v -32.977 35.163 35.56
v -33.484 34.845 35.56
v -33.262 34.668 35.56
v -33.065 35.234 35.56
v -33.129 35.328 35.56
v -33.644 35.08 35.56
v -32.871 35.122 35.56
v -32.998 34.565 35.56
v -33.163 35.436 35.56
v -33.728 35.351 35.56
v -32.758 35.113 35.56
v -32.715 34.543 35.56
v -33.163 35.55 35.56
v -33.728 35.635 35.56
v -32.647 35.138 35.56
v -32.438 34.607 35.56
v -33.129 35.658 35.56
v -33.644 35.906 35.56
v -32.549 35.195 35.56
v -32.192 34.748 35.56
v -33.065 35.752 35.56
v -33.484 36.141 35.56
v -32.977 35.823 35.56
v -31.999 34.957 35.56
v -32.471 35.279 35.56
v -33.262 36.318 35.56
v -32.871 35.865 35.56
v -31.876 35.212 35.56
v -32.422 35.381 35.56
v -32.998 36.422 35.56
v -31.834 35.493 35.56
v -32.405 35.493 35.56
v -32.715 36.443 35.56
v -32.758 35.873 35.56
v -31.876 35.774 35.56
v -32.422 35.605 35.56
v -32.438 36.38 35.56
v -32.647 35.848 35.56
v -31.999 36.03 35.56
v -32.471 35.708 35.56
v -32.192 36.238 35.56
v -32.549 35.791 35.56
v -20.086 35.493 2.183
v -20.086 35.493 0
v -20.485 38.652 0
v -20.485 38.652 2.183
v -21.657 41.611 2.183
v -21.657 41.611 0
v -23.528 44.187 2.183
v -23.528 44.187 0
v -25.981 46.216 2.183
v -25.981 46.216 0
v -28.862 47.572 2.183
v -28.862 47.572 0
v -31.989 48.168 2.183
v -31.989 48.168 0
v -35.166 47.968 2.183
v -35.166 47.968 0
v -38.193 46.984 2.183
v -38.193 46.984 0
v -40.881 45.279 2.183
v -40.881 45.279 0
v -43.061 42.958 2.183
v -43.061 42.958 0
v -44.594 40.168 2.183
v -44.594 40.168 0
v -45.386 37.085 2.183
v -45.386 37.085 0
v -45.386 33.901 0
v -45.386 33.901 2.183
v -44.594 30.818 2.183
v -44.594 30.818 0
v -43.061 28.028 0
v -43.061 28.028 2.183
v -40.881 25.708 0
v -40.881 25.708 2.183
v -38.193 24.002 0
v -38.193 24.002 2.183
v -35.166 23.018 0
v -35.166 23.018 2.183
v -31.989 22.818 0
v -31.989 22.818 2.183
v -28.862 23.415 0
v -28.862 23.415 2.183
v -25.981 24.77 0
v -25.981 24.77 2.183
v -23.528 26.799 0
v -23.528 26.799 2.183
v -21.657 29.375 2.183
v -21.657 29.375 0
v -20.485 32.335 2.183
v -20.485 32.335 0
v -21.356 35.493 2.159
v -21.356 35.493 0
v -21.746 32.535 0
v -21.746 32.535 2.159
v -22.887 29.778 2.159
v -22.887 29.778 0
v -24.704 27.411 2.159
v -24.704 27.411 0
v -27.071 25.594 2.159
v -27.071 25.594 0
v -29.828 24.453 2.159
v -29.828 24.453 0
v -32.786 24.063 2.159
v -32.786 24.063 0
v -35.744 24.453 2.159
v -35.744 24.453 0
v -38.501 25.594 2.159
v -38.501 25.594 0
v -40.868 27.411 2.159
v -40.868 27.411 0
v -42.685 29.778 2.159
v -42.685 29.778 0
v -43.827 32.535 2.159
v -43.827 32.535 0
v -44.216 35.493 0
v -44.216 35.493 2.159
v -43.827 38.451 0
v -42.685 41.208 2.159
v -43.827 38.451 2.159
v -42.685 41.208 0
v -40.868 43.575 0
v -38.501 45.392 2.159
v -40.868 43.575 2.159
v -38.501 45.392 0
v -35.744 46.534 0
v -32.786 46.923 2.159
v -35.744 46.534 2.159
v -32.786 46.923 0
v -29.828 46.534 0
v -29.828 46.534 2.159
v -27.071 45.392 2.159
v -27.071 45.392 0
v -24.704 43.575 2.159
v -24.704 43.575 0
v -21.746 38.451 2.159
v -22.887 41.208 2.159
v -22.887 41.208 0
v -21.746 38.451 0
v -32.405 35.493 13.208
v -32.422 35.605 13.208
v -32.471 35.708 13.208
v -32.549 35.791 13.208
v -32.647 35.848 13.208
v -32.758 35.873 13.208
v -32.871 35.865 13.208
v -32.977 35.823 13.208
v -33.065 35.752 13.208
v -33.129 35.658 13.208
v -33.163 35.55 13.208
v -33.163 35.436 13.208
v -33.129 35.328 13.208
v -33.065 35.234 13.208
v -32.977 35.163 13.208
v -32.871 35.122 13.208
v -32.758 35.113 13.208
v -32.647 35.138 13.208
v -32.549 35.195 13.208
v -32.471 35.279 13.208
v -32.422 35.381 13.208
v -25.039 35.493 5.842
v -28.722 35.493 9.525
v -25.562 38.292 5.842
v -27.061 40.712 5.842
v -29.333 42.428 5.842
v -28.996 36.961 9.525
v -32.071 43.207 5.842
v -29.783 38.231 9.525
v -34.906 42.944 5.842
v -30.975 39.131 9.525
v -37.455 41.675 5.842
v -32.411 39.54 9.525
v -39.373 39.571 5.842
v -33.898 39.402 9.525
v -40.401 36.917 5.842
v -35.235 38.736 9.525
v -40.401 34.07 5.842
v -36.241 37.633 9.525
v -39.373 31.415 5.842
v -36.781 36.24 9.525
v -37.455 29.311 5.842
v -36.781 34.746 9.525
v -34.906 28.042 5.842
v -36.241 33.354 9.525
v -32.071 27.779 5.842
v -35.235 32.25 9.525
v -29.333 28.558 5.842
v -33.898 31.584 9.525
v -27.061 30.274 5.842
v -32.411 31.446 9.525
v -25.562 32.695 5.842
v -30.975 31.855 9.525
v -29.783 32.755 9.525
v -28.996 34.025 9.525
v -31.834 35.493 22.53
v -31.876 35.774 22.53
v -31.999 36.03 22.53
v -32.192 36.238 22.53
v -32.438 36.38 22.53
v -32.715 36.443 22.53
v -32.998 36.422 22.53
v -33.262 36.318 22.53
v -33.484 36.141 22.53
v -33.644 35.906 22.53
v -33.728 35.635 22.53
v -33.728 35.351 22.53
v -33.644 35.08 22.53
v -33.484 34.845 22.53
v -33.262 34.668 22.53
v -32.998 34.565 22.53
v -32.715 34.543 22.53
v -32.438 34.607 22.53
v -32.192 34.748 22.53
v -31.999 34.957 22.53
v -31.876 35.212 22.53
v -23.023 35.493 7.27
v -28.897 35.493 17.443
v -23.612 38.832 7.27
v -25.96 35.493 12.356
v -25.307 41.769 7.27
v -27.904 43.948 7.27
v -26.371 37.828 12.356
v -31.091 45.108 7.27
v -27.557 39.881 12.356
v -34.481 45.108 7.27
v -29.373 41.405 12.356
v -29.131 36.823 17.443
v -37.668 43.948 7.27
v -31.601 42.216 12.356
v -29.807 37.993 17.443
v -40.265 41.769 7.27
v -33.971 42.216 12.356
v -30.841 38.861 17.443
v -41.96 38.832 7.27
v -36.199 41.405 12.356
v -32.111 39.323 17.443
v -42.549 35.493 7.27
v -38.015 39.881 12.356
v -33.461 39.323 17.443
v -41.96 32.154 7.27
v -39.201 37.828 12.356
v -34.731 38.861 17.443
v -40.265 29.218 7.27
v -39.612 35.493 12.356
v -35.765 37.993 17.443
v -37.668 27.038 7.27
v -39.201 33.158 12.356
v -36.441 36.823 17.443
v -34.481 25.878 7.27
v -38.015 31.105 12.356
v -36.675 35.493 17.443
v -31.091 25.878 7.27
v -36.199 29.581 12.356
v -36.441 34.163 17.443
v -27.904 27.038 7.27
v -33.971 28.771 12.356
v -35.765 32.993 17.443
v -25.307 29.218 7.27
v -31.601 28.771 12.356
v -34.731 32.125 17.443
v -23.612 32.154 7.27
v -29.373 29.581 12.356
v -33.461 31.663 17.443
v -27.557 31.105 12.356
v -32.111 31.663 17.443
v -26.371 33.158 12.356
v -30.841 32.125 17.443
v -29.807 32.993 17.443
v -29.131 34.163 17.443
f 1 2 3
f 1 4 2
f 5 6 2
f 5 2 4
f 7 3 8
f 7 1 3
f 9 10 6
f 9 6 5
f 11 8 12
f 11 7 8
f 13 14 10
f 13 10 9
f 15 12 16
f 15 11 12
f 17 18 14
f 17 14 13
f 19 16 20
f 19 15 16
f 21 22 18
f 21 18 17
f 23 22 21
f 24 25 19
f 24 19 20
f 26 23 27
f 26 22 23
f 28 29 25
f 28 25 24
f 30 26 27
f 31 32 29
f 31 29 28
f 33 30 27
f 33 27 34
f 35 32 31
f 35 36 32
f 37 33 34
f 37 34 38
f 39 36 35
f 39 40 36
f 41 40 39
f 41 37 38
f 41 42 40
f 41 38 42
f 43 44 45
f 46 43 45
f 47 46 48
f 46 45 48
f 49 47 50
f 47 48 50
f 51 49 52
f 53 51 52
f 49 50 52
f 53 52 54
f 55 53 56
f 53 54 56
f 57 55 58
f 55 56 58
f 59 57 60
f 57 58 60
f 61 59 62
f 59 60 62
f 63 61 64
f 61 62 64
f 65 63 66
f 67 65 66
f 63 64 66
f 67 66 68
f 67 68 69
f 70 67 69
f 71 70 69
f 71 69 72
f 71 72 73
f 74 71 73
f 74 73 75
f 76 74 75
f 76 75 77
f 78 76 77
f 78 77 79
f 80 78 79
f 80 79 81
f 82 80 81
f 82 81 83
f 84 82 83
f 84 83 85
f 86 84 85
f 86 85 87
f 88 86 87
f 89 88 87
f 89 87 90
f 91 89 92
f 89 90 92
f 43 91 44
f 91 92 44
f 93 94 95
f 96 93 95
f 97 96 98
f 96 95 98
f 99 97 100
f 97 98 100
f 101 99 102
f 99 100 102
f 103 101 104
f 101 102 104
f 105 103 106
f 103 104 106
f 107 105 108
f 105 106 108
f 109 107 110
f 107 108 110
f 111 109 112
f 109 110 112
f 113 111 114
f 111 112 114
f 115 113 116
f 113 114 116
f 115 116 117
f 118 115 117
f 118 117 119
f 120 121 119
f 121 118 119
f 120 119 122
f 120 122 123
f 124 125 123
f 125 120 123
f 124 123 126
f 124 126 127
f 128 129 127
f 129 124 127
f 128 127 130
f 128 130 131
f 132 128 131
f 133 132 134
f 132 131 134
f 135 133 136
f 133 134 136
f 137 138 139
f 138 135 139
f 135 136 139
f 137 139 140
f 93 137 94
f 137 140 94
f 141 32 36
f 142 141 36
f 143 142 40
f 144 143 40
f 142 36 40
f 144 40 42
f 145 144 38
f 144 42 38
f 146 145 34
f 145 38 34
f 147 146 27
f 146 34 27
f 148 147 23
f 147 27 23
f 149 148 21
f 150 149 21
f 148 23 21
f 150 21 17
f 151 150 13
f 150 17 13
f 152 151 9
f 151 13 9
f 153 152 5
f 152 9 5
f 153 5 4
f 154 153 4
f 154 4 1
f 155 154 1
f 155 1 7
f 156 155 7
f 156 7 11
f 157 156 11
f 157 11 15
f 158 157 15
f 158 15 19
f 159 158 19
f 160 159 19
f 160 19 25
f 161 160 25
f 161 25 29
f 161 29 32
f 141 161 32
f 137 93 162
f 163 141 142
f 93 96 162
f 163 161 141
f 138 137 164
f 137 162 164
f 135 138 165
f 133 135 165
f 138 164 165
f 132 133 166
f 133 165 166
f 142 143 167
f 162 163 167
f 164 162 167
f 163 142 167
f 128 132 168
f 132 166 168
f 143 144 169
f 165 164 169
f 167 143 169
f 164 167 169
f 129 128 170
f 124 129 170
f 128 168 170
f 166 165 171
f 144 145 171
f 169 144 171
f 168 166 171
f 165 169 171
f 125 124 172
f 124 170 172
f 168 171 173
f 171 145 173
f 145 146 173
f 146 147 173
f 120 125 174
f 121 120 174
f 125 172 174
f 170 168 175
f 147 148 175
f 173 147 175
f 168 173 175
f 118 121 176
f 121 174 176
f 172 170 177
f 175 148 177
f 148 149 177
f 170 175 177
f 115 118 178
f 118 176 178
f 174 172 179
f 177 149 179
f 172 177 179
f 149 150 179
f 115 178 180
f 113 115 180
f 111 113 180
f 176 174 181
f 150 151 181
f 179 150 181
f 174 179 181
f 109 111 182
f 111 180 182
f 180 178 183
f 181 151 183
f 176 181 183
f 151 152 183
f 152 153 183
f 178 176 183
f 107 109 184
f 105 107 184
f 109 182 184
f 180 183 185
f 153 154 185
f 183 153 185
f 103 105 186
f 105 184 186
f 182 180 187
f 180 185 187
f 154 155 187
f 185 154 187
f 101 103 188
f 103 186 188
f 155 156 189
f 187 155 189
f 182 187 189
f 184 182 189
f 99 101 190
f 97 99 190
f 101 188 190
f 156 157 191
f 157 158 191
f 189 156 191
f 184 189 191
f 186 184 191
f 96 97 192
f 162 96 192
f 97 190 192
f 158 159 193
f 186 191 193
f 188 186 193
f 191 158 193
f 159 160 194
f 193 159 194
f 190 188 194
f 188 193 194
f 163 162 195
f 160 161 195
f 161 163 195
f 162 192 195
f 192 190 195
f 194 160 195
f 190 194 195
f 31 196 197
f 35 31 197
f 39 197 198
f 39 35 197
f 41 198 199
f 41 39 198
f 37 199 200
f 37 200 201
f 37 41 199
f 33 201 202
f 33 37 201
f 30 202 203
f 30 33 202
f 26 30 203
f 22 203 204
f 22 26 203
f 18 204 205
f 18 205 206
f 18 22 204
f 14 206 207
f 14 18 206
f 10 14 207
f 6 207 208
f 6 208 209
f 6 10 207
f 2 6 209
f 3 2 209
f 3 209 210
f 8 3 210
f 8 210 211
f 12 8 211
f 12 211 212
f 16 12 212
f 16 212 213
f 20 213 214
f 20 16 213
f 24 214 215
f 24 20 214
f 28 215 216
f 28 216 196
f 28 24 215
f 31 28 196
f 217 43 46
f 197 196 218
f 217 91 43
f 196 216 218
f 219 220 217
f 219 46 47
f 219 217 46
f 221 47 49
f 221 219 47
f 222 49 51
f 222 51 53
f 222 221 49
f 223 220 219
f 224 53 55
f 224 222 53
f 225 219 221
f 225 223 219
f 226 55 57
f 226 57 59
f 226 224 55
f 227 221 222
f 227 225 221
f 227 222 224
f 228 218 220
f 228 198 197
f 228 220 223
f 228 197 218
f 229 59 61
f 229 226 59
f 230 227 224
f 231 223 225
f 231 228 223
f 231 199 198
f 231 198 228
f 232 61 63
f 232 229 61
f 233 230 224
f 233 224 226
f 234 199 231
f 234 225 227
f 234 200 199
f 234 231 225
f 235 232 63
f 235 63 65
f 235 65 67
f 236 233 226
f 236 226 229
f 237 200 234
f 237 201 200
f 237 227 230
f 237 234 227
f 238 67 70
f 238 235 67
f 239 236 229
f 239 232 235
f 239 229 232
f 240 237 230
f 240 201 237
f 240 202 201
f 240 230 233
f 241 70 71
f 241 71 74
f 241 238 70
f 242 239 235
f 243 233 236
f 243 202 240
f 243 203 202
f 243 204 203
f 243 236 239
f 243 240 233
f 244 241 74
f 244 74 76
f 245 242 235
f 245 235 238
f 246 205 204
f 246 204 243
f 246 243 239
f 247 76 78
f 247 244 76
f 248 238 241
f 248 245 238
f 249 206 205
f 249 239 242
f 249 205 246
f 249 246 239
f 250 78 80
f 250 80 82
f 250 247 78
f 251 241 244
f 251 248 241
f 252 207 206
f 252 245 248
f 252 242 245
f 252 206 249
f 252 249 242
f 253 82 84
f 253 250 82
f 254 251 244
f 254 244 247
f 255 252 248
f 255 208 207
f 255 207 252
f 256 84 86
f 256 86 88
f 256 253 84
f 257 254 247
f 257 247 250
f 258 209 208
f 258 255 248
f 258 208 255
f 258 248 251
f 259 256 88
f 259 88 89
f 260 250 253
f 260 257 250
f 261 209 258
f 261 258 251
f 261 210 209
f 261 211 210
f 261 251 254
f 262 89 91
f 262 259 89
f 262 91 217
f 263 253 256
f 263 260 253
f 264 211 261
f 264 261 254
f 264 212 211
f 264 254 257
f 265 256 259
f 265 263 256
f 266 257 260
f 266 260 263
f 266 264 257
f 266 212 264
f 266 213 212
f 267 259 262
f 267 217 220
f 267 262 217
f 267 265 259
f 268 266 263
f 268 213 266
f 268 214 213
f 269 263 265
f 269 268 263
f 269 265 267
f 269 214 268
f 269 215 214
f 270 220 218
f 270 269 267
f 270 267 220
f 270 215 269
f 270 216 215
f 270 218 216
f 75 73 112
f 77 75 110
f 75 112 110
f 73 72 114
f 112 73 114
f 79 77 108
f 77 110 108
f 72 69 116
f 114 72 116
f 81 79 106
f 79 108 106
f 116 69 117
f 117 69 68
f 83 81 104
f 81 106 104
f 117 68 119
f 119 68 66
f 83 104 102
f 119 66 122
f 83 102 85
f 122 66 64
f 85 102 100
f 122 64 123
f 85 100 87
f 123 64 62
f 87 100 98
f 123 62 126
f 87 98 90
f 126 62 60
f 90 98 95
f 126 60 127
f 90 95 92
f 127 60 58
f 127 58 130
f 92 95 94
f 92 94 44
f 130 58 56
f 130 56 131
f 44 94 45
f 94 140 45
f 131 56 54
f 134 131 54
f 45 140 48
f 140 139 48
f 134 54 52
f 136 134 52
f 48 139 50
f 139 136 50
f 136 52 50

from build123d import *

# Parameters (mm, degrees)
F0_R        = 12.7
F1_DEPTH    = 22.86
F2_R        = 0.9525
F3_DEPTH    = 12.7
F4_R        = 0.381
F5_DEPTH    = 35.561
F6_S5_R     = 0.9525
F6_T6_DEPTH = 22
F7_R        = 11.43
F8_DEPTH    = 1.27
F9_S5_R     = 11.43
F9_T6_DEPTH = 20


# Not quite as in the source:
# - a fillet or chamfer that OpenCascade refuses, or shapes differently, is made with other operations: its cross-section is extruded or revolved along the edge and cut away or added


with BuildPart() as f1:
    # F0 (on Top) → F1 (new body)
    with BuildSketch(Plane.XY):
        with Locations((-32.7860526741, 35.493157804)):
            Circle(F0_R)
    extrude(amount=F1_DEPTH)

    # F2 (on face) → F3 (join)
    with BuildSketch(Plane.XY.offset(22.86)):
        with Locations((-32.7860526741, 35.493157804)):
            Circle(F2_R)
    extrude(amount=F3_DEPTH)

    # F4 (on face) → F5 (cut, through all)
    with BuildSketch(Plane.XY.offset(35.56)):
        with Locations((-32.7860526741, 35.493157804)):
            Circle(F4_R)
    extrude(amount=-F5_DEPTH, mode=Mode.SUBTRACT)

    # F6: chamfer of 11.938 x 20.6772225408 on 1 edges, made by hand


with BuildPart() as f6_tool2:
    # F6_s3 → F6_t4 (revolve)
    with BuildSketch(Plane.XZ.offset(-35.493157804)):
        Polygon((-20.0860526741, 2.1827774592), (-32.0240526741, 22.86), (-20.0860526741, 22.86), align=None)
    revolve(axis=Axis((-32.7860526741, 35.493157804, 22.86), (0, 0, 1)))

    # F6_s5 → F6_t6 (cut, symmetric)
    with BuildSketch(Plane.XY.offset(12.5)):
        with Locations((-32.7860526741, 35.493157804)):
            Circle(F6_S5_R)
    extrude(amount=F6_T6_DEPTH, both=True, mode=Mode.SUBTRACT)


with BuildPart() as f1_1:
    add(f1.part)

    # F6_t1: cut F6_tool2
    add(f6_tool2.part, mode=Mode.SUBTRACT)

    # F7 (on face) → F8 (cut)
    with BuildSketch(Plane(origin=(0, 0, 0), x_dir=(1, 0, 0), z_dir=(0, 0, -1))):
        with Locations((-32.7860526741, -35.493157804)):
            Circle(F7_R)
    extrude(amount=-F8_DEPTH, mode=Mode.SUBTRACT)

    # F9: chamfer of 11.938 on 1 edges, made by hand


with BuildPart() as f9_tool2:
    # F9_s3 → F9_t4 (revolve)
    with BuildSketch(Plane.XZ.offset(-35.493157804)):
        Polygon((-20.4670526741, 1.27), (-32.4050526741, 13.208), (-32.4050526741, 1.27), align=None)
    revolve(axis=Axis((-32.7860526741, 35.493157804, 1.27), (0, 0, 1)))

    # F9_s5 → F9_t6 (intersect, symmetric)
    with BuildSketch(Plane.XY.offset(7.2)):
        with Locations((-32.7860526741, 35.493157804)):
            Circle(F9_S5_R)
    extrude(amount=F9_T6_DEPTH, both=True, mode=Mode.INTERSECT)


with BuildPart() as f1_2:
    add(f1_1.part)

    # F9_t1: cut F9_tool2
    add(f9_tool2.part, mode=Mode.SUBTRACT)


solid = f1_2.part
